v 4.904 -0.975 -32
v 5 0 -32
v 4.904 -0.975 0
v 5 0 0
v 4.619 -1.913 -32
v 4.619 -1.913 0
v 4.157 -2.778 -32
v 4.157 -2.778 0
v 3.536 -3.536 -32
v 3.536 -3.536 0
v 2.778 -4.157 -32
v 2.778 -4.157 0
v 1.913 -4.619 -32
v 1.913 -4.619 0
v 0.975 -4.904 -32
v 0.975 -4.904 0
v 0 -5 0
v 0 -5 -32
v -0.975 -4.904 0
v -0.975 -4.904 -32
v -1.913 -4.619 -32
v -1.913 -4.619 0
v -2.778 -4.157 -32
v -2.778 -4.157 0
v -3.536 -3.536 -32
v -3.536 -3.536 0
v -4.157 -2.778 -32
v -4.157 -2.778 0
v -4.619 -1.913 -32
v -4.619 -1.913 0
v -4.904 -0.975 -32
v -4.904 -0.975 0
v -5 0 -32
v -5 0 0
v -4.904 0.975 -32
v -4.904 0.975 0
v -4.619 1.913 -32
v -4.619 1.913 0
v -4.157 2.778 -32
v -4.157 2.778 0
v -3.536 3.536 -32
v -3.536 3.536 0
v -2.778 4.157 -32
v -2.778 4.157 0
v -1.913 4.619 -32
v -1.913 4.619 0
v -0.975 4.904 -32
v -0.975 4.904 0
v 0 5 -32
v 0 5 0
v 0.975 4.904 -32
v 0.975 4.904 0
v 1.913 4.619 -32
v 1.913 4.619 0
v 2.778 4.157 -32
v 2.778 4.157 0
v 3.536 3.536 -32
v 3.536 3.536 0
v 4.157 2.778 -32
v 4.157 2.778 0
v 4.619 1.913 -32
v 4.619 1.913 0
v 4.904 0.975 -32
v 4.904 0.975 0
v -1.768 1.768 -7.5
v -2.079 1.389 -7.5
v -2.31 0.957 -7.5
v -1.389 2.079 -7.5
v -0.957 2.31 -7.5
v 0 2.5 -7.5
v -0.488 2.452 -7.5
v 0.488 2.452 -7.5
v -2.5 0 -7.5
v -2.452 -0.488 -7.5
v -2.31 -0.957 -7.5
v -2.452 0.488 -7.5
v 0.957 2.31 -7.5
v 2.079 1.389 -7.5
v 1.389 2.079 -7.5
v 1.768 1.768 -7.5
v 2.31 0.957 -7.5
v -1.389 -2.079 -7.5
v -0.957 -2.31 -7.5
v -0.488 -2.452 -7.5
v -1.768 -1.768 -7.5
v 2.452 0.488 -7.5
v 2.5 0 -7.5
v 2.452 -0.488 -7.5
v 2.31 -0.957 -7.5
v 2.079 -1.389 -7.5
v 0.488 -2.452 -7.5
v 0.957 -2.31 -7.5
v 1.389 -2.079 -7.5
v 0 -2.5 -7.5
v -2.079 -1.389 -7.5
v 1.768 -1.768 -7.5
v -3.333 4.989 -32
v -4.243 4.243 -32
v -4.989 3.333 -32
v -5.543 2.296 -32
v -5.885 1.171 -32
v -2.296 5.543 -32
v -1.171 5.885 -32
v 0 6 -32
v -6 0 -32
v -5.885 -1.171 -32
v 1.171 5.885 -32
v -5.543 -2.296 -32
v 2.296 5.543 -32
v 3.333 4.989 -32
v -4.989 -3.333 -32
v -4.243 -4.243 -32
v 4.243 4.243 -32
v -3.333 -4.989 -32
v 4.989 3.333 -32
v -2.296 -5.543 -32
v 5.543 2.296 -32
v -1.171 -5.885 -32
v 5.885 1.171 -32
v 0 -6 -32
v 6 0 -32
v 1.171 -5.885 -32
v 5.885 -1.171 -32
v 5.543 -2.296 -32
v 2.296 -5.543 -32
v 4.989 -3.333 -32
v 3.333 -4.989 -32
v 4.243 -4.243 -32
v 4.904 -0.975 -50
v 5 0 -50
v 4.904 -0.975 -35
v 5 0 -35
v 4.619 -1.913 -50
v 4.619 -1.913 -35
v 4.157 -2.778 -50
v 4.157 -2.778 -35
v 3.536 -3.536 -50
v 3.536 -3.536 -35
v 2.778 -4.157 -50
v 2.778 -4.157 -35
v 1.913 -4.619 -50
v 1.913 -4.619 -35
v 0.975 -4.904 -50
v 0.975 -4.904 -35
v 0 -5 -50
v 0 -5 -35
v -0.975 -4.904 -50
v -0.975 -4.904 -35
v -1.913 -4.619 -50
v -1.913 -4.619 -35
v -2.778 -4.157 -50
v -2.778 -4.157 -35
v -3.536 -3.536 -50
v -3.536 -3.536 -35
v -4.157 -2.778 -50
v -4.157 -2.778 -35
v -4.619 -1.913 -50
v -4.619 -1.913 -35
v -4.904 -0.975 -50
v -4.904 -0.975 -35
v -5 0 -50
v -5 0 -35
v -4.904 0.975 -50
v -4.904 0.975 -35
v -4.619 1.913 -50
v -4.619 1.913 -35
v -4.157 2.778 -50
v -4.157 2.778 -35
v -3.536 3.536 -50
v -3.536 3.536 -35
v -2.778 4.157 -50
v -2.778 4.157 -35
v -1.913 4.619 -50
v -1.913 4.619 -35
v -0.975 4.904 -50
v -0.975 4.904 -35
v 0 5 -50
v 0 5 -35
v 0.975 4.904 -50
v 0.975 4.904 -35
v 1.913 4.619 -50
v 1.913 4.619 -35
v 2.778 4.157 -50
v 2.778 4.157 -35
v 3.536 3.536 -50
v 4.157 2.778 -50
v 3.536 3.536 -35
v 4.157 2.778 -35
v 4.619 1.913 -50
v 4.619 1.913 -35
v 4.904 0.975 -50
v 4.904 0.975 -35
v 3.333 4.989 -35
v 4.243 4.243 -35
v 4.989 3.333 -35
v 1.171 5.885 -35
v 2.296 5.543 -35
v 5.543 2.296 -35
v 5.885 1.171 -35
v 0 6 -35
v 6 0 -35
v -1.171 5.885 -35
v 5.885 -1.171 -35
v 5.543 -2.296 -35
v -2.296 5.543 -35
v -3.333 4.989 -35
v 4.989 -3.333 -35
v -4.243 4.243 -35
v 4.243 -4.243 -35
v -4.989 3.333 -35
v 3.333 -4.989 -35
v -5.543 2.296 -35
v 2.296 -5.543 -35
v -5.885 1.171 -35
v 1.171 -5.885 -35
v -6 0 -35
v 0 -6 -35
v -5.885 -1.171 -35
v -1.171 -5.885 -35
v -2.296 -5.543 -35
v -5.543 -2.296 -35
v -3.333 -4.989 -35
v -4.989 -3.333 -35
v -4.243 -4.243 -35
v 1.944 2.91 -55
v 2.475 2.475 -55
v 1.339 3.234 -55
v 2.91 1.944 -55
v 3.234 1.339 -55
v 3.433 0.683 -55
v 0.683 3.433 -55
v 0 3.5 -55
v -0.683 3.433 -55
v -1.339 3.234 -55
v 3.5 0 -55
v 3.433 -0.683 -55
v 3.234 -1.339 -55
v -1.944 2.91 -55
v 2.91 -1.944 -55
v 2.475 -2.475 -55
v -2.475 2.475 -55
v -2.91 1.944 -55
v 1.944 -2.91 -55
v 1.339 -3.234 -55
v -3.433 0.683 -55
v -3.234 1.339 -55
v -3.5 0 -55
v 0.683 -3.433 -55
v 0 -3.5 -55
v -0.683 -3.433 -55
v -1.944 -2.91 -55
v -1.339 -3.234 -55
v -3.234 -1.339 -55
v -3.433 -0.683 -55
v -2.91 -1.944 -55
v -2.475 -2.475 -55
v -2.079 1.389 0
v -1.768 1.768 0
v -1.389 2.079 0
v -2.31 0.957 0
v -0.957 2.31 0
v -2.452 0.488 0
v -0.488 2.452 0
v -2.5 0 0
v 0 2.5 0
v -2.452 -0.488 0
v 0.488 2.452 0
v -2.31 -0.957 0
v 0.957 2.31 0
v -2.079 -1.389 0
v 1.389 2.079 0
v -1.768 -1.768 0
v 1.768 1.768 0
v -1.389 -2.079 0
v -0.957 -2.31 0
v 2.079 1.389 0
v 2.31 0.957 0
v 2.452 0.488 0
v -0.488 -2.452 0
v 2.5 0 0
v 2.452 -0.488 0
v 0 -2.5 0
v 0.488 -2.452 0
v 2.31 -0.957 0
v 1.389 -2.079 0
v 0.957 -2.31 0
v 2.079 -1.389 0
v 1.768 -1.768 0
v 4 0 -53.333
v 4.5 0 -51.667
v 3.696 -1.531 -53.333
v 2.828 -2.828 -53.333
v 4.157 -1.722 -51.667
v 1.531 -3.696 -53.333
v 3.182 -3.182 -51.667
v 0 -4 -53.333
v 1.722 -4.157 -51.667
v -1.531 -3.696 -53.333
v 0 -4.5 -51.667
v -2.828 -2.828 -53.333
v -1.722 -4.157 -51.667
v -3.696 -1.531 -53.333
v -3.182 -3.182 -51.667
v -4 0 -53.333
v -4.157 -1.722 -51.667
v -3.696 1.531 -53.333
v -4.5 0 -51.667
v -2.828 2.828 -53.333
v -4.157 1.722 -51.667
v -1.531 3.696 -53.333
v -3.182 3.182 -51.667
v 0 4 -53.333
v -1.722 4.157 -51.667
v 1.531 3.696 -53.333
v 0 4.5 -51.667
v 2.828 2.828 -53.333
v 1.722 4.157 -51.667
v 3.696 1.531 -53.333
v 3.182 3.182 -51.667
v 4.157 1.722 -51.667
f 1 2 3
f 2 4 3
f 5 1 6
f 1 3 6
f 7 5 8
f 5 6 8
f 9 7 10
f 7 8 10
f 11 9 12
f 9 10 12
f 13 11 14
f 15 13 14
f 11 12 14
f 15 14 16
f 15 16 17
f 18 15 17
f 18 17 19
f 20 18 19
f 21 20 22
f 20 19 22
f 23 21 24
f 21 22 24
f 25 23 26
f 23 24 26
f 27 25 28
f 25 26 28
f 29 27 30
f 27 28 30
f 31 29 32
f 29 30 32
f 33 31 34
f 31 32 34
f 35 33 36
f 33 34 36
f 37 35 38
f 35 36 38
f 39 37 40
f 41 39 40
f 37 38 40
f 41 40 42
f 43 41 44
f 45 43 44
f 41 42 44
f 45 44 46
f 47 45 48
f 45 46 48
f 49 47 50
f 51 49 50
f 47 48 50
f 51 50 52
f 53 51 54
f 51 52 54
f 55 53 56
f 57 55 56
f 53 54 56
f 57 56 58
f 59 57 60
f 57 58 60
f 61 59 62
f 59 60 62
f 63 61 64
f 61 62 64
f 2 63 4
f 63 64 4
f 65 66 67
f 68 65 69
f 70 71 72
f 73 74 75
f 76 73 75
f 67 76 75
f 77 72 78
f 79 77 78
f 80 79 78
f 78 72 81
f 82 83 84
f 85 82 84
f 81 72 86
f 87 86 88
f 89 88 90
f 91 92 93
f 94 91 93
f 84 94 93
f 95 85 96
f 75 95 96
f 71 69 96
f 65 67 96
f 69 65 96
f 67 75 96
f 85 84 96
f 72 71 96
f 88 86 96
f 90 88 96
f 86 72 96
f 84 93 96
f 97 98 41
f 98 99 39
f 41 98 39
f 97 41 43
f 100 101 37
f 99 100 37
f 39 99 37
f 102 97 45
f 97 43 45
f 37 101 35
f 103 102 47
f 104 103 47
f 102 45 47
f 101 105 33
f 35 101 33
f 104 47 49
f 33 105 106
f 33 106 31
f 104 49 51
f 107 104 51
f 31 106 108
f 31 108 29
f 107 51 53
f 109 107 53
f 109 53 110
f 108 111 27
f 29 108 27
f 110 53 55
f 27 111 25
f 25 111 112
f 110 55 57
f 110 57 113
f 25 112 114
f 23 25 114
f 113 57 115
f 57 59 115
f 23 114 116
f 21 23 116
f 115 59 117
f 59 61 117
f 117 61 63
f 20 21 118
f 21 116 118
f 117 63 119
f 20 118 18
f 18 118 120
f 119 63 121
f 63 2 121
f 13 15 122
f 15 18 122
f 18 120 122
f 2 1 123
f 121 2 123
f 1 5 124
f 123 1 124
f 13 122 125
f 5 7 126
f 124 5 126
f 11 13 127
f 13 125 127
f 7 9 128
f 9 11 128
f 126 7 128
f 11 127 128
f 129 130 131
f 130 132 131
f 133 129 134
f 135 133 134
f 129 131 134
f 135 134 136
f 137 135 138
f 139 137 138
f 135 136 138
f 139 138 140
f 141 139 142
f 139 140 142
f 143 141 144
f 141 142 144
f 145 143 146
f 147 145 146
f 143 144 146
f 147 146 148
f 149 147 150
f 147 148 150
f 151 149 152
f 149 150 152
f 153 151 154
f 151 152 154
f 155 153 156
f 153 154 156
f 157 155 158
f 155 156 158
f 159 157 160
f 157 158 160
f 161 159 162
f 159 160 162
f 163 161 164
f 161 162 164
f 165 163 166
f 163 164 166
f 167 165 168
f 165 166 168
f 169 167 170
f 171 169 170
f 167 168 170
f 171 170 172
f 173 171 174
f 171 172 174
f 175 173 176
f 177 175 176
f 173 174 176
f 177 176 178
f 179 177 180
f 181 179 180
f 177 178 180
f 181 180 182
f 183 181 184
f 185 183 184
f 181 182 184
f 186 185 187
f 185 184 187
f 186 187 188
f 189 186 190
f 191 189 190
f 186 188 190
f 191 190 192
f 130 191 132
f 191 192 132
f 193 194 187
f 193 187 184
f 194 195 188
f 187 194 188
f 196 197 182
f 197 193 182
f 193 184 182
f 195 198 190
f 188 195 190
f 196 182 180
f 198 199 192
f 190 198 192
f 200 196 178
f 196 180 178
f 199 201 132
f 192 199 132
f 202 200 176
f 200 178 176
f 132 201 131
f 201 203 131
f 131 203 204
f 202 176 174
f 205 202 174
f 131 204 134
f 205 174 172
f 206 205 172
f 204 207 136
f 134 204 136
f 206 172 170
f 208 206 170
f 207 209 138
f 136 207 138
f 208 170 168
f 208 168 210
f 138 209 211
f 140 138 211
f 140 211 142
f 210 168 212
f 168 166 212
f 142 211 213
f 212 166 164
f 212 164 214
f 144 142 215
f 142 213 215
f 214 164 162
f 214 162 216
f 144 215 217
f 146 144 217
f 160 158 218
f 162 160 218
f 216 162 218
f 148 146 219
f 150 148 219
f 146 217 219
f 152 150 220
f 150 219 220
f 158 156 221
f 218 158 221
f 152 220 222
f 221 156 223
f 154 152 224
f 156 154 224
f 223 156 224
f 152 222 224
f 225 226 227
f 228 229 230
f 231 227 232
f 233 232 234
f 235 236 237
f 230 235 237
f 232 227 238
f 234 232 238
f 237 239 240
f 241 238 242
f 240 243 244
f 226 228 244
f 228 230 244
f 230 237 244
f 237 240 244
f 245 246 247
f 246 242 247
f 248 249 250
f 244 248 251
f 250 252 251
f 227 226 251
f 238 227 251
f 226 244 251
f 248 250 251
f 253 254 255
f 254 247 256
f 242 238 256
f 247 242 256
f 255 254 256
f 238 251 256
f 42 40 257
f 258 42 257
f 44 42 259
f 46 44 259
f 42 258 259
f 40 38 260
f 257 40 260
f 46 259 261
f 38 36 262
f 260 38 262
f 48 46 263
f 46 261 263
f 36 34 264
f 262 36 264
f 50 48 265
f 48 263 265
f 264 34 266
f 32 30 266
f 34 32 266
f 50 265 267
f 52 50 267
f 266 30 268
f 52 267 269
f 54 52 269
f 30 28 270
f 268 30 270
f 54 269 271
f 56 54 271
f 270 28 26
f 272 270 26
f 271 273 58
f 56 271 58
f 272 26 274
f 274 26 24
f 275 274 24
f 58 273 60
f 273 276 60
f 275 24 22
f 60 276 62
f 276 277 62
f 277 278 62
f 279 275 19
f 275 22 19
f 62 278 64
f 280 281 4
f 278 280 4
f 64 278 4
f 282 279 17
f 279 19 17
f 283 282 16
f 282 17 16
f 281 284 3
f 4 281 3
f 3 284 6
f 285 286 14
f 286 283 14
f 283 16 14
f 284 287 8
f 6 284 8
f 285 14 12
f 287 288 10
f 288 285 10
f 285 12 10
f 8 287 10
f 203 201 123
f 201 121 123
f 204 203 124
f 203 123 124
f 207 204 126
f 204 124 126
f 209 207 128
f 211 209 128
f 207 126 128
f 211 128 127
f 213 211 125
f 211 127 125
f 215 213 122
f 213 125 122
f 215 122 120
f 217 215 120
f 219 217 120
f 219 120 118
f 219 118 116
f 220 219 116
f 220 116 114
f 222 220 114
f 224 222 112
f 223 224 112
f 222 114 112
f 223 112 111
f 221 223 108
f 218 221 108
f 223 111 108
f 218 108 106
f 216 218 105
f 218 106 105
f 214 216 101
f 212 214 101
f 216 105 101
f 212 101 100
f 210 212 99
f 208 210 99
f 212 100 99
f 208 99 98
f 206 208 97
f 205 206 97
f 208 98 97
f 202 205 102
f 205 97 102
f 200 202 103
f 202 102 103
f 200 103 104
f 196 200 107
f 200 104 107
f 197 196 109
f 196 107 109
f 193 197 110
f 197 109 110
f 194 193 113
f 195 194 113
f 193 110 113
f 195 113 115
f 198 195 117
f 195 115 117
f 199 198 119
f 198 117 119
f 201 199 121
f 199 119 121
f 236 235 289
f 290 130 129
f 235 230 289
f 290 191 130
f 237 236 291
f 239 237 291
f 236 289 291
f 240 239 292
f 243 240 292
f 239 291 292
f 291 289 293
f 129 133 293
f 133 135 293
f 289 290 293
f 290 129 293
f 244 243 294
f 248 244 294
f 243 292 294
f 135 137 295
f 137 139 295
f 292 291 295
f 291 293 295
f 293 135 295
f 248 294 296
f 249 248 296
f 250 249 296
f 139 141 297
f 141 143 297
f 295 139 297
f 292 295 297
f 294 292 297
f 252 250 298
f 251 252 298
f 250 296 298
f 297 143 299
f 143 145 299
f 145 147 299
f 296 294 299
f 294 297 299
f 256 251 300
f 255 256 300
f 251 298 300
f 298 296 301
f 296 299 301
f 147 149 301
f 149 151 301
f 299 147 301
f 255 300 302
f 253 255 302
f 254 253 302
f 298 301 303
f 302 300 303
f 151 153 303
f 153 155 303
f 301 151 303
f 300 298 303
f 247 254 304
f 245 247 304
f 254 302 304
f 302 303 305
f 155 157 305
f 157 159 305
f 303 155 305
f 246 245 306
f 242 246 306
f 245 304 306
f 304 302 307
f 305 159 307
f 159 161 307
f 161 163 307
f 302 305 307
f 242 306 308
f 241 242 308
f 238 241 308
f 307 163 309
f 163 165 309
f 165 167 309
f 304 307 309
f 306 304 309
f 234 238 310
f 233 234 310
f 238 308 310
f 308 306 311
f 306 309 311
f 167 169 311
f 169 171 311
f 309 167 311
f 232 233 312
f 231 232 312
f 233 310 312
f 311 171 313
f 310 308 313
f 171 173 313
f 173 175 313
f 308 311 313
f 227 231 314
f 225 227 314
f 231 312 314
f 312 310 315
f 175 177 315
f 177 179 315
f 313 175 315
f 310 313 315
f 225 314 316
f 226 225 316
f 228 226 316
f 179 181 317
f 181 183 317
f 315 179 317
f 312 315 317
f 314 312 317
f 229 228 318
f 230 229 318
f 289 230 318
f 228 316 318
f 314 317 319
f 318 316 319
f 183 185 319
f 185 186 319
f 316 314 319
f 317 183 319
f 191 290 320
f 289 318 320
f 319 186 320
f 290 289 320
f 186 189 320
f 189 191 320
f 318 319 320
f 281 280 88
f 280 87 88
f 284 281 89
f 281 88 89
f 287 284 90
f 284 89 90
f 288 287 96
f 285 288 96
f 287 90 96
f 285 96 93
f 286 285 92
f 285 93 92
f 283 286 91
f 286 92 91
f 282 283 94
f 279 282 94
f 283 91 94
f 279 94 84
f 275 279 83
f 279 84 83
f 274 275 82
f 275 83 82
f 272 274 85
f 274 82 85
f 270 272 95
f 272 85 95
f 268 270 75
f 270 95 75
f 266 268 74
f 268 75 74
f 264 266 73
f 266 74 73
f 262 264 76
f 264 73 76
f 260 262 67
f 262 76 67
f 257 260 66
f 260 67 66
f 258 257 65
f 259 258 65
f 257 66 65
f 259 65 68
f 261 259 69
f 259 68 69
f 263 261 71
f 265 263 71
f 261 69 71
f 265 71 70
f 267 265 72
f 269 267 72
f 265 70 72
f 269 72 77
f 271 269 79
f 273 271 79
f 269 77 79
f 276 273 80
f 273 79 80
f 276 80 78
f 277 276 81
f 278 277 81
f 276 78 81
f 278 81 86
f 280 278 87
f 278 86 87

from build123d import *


with BuildPart() as f1:
    # F0 (on Front) → F1 (revolve)
    with BuildSketch(Plane.XZ):
        Polygon((5, 0), (2.5, 0), (2.5, -7.5), (0, -7.5), (0, -32), (0, -35), (0, -50), (3.5, -50), (5, -50), (5, -35), (6, -35), (6, -32), (5, -32), align=None)
        Polygon((3.5, -50), (0, -50), (0, -55), (3.5, -55), (5, -50), align=None)
    revolve(axis=Axis((0, 0, -28.75), (0, 0, -1)))


solid = f1.part
